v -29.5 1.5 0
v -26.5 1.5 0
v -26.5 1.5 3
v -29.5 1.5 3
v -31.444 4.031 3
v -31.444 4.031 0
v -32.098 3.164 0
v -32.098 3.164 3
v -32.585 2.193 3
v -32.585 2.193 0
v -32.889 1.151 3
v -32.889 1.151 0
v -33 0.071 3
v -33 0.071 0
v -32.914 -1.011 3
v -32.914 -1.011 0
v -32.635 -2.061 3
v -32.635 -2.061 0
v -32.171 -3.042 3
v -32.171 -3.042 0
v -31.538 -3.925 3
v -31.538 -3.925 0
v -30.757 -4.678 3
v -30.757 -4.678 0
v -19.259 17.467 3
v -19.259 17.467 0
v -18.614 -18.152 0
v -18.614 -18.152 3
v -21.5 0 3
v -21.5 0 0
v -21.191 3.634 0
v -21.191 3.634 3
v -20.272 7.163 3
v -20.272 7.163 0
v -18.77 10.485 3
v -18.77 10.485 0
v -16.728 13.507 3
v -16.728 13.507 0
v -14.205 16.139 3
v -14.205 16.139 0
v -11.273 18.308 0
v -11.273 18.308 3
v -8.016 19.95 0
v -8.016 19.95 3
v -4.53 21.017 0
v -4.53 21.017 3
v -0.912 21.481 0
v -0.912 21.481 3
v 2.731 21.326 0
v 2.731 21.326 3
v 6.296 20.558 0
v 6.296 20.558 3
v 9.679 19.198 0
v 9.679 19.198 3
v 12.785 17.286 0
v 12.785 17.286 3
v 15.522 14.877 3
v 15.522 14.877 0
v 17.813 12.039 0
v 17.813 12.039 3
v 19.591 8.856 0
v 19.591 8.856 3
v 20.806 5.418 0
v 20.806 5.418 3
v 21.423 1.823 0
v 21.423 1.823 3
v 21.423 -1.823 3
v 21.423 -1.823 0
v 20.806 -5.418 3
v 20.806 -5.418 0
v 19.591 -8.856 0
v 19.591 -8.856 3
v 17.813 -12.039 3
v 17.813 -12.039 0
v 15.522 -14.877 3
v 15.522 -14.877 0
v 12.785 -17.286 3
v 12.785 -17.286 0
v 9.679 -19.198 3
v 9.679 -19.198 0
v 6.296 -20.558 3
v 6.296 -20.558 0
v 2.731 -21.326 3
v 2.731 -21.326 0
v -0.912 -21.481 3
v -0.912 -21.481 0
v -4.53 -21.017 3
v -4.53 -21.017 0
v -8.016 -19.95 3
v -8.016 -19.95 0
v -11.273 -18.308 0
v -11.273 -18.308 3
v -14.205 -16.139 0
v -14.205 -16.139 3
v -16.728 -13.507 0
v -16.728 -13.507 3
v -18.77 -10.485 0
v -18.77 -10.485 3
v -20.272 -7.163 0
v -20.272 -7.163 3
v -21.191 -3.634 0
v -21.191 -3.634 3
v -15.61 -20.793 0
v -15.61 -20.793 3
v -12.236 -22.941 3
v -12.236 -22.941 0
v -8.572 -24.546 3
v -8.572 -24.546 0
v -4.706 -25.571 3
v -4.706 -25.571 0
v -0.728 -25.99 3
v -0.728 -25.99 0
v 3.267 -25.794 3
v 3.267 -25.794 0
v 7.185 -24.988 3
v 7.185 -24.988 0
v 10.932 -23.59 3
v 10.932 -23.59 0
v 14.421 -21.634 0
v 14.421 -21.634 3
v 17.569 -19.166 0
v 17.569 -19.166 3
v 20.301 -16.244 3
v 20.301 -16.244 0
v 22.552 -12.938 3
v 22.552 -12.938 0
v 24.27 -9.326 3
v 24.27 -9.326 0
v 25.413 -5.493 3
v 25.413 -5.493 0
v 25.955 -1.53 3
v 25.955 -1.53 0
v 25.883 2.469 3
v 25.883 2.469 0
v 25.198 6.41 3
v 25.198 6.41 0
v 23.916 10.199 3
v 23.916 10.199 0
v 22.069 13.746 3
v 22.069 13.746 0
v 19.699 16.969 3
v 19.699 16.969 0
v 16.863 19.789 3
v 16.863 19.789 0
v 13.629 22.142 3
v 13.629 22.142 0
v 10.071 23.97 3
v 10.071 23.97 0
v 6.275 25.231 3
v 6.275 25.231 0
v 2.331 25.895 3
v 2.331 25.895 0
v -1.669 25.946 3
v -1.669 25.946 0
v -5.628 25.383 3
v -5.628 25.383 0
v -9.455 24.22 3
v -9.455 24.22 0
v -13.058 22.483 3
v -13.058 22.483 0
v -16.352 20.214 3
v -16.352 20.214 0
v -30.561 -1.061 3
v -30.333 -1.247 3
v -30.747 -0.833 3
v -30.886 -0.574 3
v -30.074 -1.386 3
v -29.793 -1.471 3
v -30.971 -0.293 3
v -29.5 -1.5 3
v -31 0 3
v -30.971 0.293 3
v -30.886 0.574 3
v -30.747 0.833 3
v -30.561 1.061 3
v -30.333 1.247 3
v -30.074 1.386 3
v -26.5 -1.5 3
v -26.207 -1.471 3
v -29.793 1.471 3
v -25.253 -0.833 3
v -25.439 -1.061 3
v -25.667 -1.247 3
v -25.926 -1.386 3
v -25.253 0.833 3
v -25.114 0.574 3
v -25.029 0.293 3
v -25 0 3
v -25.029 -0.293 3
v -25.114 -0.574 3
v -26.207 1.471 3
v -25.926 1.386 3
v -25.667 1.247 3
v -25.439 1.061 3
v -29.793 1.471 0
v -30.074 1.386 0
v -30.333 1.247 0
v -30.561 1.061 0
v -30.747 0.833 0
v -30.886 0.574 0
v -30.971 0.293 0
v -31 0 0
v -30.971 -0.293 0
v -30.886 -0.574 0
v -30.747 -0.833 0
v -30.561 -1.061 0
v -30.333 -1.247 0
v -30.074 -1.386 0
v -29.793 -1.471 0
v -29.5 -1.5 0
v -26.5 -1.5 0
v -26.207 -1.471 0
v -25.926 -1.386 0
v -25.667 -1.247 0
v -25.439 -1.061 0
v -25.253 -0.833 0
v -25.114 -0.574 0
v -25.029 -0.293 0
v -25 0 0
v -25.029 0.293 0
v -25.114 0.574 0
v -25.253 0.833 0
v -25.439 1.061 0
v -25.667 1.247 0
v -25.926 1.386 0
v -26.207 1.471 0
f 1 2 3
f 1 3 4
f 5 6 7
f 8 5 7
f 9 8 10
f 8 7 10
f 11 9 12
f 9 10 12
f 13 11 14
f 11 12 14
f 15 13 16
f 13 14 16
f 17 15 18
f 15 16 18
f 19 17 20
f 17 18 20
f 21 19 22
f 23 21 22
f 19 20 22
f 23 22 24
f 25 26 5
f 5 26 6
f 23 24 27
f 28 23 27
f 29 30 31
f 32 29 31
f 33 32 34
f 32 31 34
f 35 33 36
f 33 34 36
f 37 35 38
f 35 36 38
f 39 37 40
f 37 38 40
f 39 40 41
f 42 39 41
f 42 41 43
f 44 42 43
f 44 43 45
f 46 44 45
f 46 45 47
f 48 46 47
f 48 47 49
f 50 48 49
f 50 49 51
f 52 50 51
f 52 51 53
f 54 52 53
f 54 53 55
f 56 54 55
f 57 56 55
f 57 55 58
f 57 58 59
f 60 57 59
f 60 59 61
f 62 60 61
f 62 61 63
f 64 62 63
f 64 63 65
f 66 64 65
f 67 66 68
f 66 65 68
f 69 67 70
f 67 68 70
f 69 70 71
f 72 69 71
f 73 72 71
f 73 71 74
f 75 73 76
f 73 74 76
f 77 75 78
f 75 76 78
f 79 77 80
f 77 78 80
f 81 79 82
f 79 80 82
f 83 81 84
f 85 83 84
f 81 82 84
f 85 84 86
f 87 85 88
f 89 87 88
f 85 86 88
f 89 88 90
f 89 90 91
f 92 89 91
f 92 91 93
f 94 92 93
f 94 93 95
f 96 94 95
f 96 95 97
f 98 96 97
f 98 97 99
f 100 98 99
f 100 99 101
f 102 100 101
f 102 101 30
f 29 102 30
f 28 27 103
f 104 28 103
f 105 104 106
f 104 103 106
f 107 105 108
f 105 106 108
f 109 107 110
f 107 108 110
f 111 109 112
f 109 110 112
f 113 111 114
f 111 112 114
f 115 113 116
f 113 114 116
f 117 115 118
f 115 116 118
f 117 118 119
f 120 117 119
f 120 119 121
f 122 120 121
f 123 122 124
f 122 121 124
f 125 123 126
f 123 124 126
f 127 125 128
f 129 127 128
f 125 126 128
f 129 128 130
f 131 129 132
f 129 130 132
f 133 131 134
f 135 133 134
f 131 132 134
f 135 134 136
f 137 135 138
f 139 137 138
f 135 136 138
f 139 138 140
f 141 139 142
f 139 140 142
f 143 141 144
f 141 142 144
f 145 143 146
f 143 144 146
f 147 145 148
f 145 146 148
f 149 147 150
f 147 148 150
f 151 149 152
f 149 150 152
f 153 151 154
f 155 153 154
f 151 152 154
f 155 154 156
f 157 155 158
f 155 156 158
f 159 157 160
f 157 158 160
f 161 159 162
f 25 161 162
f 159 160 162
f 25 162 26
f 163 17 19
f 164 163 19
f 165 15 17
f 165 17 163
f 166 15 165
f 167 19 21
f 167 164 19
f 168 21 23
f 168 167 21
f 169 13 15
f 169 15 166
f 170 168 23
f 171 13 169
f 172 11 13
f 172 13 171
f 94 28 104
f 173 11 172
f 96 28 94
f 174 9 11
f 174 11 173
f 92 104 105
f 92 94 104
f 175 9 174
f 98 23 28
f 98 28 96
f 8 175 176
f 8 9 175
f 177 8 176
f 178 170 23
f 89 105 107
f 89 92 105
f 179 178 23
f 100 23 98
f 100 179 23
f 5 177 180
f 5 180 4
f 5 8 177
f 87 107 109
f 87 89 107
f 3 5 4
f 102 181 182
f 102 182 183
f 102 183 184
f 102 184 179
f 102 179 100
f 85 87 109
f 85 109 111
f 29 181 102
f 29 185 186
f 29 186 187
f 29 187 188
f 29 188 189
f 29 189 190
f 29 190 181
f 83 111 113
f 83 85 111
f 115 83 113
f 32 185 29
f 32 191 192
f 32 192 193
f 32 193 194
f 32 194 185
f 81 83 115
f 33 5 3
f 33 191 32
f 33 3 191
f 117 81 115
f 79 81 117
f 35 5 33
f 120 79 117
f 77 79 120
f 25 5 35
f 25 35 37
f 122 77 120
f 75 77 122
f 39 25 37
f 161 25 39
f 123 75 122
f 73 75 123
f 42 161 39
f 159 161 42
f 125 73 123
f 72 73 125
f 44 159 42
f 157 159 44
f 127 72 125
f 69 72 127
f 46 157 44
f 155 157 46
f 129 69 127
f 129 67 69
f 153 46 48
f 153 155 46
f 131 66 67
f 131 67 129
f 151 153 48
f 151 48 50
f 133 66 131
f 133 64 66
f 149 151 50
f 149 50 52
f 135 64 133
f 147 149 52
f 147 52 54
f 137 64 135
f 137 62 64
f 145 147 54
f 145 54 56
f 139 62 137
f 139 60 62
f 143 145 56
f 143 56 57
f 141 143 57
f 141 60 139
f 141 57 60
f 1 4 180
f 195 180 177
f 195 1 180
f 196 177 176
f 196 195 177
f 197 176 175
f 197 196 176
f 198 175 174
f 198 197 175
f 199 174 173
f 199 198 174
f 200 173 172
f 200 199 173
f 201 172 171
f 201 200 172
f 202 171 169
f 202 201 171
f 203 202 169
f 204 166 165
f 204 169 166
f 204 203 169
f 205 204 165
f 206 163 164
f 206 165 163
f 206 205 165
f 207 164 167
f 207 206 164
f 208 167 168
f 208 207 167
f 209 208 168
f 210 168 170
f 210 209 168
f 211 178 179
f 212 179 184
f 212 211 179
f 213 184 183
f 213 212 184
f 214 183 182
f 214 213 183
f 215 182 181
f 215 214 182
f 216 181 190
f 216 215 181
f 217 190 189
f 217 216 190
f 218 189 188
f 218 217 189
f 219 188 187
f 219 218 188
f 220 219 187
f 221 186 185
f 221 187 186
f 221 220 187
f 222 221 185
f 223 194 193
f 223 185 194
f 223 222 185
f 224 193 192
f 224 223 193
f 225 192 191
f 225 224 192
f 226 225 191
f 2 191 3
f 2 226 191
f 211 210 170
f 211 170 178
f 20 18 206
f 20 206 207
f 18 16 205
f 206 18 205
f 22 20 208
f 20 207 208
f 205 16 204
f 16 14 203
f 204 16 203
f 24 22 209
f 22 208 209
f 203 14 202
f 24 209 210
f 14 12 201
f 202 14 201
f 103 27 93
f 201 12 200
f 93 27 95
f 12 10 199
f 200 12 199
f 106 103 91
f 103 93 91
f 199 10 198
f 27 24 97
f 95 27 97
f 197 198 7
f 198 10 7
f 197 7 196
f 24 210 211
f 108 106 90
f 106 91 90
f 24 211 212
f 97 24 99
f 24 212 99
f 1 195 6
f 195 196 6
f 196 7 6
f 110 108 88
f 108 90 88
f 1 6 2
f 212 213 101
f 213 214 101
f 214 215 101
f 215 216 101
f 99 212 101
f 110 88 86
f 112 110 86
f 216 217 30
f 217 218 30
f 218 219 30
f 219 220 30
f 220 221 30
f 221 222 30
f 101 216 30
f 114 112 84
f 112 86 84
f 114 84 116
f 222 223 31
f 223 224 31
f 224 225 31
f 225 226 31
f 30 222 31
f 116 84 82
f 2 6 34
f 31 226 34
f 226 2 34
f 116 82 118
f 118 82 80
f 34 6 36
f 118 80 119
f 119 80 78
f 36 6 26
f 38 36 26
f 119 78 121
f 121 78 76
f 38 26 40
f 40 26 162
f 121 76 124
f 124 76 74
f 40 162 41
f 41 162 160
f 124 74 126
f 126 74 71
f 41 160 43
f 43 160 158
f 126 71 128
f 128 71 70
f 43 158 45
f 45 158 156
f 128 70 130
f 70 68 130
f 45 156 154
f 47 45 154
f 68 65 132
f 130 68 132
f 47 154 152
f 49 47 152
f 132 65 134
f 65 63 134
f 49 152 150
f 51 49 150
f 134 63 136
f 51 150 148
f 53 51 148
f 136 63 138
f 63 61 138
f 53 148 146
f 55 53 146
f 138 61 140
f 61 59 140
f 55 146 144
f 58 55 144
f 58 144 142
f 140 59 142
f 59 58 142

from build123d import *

# Parameters (mm, degrees)
EXTRUDE_1_DEPTH     = 3
SKETCH_2_R          = 21.5
CUT_EXTRUDE_1_DEPTH = 10


with BuildPart() as part:
    # 스케치1 → 보스-돌출1 (new body)
    with BuildSketch(Plane.XY):
        with BuildLine():
            Line((-19.259259259, 17.466566142), (-31.444444444, 4.030746033))
            ThreePointArc((-31.444444444, 4.030746033), (-32.981389073, -0.472212618), (-30.756898072, -4.678217276))
            Line((-30.756898072, -4.678217276), (-18.61420291, -18.152450249))
            ThreePointArc((-18.61420291, -18.152450249), (25.995737465, 0.470779859), (-19.259259259, 17.466566142))
        make_face()
    extrude(amount=EXTRUDE_1_DEPTH)

    # 스케치2 → 컷-돌출1 (cut)
    with BuildSketch(Plane(origin=(0, 0, 0), x_dir=(-1, 0, 0), z_dir=(0, 0, -1))):
        Circle(SKETCH_2_R)
        with BuildLine():
            Line((26.5, 1.5), (29.5, 1.5))
            ThreePointArc((29.5, 1.5), (31, 0), (29.5, -1.5))
            Line((29.5, -1.5), (26.5, -1.5))
            ThreePointArc((26.5, -1.5), (25, 0), (26.5, 1.5))
        make_face()
    extrude(amount=-CUT_EXTRUDE_1_DEPTH, mode=Mode.SUBTRACT)


solid = part.part
